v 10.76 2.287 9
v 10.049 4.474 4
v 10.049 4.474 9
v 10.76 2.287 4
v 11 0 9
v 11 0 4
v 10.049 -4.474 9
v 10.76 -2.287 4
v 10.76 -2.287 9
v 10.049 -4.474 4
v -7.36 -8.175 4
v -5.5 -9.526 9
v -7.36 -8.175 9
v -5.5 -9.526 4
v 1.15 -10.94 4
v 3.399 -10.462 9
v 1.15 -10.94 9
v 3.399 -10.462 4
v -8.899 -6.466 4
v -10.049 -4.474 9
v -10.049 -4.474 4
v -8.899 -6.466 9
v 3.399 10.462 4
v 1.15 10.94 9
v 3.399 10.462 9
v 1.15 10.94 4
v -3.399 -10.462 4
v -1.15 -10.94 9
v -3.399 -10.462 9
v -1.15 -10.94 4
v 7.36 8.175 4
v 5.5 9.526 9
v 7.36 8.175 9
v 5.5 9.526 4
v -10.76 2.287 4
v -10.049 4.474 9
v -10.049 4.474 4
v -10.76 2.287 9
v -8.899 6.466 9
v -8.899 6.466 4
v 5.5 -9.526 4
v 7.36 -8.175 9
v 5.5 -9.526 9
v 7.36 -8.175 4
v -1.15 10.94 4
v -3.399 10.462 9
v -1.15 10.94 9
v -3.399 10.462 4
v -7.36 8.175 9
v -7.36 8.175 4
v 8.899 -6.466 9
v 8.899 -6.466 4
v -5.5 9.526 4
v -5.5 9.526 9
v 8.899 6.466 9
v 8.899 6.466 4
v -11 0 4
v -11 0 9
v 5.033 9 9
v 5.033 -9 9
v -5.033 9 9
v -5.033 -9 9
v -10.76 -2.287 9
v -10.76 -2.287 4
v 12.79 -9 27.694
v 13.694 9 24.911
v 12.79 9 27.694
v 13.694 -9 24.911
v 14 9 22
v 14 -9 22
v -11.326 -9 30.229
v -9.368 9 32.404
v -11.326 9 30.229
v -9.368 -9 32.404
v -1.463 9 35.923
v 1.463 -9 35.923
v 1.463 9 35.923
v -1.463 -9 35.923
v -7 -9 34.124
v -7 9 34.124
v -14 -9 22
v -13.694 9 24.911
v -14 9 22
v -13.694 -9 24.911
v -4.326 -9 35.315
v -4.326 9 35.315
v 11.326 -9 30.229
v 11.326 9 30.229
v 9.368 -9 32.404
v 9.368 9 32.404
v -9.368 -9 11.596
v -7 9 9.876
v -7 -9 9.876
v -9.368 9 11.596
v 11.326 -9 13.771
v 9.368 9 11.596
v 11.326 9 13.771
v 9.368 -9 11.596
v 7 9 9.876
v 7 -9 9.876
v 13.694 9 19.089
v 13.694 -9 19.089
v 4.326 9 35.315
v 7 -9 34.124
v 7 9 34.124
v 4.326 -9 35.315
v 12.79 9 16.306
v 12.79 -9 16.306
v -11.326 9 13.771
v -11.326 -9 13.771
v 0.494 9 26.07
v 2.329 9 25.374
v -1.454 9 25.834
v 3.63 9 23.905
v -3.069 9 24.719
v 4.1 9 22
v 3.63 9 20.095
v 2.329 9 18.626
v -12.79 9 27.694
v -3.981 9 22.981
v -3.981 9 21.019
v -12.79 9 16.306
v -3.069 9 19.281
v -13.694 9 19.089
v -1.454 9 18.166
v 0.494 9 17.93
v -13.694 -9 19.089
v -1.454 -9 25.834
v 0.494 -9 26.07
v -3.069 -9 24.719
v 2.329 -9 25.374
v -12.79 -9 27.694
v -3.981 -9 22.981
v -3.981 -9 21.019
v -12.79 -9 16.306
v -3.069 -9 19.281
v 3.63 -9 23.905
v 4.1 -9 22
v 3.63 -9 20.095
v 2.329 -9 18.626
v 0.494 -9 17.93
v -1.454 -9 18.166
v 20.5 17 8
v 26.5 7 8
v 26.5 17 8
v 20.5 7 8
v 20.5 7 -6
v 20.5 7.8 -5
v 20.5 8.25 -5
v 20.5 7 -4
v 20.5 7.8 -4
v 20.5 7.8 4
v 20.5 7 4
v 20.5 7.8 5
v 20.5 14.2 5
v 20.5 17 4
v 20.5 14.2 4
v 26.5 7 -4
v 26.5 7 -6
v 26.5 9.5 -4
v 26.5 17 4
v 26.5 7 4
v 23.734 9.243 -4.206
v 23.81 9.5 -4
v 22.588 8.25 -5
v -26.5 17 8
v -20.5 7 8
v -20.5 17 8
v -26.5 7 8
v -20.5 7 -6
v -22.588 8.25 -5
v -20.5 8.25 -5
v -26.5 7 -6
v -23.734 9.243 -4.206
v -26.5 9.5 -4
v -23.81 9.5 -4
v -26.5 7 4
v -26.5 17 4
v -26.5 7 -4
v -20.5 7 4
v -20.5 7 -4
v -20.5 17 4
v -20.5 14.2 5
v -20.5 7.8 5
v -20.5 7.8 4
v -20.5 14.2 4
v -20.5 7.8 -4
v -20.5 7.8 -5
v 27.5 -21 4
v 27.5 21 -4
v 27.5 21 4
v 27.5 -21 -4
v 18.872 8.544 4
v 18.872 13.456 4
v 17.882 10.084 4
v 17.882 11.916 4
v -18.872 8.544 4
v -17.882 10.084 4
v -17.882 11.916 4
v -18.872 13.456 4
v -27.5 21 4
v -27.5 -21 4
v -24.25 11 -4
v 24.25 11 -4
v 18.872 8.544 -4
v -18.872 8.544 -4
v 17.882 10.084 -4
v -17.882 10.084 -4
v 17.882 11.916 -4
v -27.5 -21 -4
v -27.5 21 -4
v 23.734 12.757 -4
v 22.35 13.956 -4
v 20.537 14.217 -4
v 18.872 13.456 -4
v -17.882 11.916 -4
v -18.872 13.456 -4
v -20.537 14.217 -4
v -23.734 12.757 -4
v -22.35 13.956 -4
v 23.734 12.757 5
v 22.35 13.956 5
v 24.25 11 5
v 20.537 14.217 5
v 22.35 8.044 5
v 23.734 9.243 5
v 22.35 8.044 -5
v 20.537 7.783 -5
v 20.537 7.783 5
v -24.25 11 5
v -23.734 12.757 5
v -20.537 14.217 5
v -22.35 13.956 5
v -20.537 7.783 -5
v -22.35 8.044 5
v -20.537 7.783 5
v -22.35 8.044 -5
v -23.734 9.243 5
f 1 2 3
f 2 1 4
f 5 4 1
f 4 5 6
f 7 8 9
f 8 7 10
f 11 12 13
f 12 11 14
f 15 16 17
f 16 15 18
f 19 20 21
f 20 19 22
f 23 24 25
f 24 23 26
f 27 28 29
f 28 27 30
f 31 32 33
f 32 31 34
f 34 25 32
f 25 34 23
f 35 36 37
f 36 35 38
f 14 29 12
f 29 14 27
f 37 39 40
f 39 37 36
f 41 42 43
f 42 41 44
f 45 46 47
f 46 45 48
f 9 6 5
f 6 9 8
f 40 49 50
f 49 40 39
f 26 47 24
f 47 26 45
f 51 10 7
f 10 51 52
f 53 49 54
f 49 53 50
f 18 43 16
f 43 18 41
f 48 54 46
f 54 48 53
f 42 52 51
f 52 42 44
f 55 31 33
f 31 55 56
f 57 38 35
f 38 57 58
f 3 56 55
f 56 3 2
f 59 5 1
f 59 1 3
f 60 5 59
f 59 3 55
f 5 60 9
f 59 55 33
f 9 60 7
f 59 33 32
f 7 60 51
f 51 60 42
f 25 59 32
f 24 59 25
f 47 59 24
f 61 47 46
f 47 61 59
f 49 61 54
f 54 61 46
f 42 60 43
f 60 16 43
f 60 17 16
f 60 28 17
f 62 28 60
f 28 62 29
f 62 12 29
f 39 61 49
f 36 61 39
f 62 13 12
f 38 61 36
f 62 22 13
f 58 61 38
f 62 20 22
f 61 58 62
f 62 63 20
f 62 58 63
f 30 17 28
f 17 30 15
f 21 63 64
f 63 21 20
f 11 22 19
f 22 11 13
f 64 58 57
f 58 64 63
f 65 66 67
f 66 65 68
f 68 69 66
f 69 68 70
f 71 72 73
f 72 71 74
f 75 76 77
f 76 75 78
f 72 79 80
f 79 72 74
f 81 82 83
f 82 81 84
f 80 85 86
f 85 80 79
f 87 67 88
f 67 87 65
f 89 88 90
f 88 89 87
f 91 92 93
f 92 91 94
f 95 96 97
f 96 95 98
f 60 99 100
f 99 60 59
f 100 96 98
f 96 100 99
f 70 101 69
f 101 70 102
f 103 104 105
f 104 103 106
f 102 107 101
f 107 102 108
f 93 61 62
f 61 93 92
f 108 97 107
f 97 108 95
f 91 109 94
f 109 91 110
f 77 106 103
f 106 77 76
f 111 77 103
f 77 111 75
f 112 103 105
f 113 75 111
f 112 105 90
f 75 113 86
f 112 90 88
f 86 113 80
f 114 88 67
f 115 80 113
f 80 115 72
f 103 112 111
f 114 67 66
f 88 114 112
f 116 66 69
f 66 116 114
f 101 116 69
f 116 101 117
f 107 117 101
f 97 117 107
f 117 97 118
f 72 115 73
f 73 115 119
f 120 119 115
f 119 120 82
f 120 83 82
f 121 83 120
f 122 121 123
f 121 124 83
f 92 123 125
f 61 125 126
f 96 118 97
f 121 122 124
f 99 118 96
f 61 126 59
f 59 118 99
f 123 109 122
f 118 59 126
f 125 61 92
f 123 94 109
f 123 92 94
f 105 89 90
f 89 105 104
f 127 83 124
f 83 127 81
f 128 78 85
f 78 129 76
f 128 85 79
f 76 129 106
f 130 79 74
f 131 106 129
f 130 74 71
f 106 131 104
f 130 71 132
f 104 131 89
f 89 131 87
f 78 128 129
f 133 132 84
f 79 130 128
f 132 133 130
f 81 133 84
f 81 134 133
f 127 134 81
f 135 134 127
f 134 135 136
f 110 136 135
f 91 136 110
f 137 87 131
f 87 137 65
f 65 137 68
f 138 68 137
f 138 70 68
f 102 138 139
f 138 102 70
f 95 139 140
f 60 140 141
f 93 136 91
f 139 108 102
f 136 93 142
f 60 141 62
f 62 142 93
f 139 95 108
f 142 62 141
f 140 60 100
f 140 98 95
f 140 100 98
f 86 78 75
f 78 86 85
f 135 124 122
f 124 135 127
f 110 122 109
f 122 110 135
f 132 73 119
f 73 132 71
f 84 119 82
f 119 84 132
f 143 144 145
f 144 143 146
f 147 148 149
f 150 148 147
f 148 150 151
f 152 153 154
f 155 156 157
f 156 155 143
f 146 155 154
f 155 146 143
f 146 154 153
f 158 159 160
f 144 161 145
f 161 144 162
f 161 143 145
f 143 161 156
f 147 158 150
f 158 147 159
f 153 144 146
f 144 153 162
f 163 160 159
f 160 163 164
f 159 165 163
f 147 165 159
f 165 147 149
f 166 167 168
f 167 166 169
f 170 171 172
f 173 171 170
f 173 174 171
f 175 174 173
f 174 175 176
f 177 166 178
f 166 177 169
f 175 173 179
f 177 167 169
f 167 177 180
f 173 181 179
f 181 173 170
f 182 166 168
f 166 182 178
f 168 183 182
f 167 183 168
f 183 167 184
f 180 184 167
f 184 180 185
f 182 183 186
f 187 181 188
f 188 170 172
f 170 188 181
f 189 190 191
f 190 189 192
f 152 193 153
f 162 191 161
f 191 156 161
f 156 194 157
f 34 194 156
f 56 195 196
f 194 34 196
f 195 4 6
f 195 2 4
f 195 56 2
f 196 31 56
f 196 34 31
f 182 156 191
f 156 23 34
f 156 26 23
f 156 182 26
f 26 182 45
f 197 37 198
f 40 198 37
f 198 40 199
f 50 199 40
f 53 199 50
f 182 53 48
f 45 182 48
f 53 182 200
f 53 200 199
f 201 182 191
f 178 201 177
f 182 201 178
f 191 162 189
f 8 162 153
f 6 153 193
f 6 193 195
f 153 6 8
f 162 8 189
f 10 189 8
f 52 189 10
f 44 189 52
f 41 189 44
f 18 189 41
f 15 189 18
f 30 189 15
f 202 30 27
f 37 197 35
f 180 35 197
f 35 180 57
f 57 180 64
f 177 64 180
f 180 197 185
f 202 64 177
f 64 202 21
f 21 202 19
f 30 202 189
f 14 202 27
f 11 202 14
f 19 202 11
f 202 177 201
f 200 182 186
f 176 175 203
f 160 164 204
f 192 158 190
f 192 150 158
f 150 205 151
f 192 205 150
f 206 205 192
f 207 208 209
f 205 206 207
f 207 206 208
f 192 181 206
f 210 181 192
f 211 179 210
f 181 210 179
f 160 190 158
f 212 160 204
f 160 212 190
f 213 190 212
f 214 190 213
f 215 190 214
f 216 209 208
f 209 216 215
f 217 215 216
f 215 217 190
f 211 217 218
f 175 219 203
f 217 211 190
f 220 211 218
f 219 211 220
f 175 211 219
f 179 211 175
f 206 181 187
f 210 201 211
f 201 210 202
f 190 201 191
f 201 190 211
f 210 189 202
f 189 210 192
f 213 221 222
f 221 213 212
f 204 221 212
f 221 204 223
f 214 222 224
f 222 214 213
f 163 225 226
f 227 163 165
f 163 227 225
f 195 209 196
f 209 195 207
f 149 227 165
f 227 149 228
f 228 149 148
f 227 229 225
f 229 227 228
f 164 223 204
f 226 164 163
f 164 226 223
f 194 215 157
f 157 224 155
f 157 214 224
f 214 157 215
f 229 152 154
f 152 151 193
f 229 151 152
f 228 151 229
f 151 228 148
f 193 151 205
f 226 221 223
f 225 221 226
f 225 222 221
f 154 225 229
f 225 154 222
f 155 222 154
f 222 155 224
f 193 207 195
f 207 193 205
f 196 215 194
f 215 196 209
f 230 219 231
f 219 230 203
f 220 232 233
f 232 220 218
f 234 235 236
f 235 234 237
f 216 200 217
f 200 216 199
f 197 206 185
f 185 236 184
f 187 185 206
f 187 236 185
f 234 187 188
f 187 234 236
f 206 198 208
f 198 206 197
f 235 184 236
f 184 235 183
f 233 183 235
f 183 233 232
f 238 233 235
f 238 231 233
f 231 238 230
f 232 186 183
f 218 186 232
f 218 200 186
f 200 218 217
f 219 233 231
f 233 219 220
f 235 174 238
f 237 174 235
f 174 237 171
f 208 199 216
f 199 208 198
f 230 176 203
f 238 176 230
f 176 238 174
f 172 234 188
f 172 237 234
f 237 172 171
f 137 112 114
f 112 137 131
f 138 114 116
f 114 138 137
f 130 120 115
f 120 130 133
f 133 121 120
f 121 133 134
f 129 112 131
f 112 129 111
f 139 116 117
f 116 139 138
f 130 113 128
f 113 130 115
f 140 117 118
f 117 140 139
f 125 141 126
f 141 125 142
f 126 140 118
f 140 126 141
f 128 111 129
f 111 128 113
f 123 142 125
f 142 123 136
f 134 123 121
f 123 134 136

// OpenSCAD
// Parameters
shaft_diameter_mm = 8.0; //[4.0:16.0:0.1]
base_length_mm = 55.0; //[27.5:110.0:0.5]
base_width_mm = 42.0; //[21.0:84.0:0.5]
mounting_hole_diameter_mm = 6.5; //[3.0:10.0:0.1]
mounting_hole_center_spacing_mm = 42.0; //[25.0:80.0:0.5]
base_thickness_mm = 8.0; //[4.0:16.0:0.5]
overall_height_mm = 28.0; //[18.0:56.0:0.5]
housing_outer_diameter_mm = 28.0; //[18.0:56.0:0.5]
seat_height_mm = 6.0; //[3.0:12.0:0.5]
seat_diameter_mm = 22.0; //[14.0:40.0:0.5]
housing_length_y_mm = 18.0; //[10.0:36.0:0.5]
bore_clearance_mm = 0.2; //[0.0:0.6:0.05]
hole_edge_margin_x_mm = 6.5; //[4.0:12.0:0.5]
hole_offset_from_front_mm = 10.0; //[6.0:18.0:0.5]
trapezoid_height_mm = 10.0; //[6.0:20.0:0.5]
trapezoid_base_y_mm = 14.0; //[8.0:28.0:0.5]
trapezoid_top_y_mm = 6.0; //[3.0:18.0:0.5]
gusset_thickness_x_mm = 6.0; //[3.0:12.0:0.5]
overlap_mm = 1.0; //[0.5:2.0:0.1]

// ---------- Helpers / derived Z positions (centered solids) ----------
base_top_z = base_thickness_mm/2;

// Seat sits on base with overlap into base
seat_center_z = base_top_z + seat_height_mm/2 - overlap_mm;

// Housing (circular ring) must intersect the seat (and thus the base) by overlap_mm
// Seat top surface Z:
seat_top_z = seat_center_z + seat_height_mm/2;
// Place housing so its bottom is overlap_mm below seat top:
housing_center_z = (seat_top_z - overlap_mm) + housing_outer_diameter_mm/2;

// Right Trapezoid
module right_trapezoid() {
  linear_extrude(height=gusset_thickness_x_mm, center=true) {
    polygon(points=[
      [0, 0],
      [trapezoid_base_y_mm, 0],
      [trapezoid_top_y_mm, trapezoid_height_mm],
      [0, trapezoid_height_mm]
    ]);
  }
}

// KP Pillow Block Hole Positions
module kp_pillow_block_hole_positions() {
  translate([mounting_hole_center_spacing_mm/2, base_width_mm/2 - hole_offset_from_front_mm, 0])
    cylinder(r=mounting_hole_diameter_mm/2, h=base_thickness_mm + 2*overlap_mm, center=true);
  mirror([1, 0, 0]) {
    translate([mounting_hole_center_spacing_mm/2, base_width_mm/2 - hole_offset_from_front_mm, 0])
      cylinder(r=mounting_hole_diameter_mm/2, h=base_thickness_mm + 2*overlap_mm, center=true);
  }
}

// KP Pillow Block (circular bearing housing/ring)
module kp_pillow_block() {
  // Positioned to overlap the seat by overlap_mm (guaranteed physical connection)
  translate([0, 0, housing_center_z])
    rotate([90, 0, 0])
    cylinder(r=housing_outer_diameter_mm/2, h=housing_length_y_mm, center=true);
}

// KP Pillow Block Assembly (seat + housing + gussets)
module kp_pillow_block_assembly() {
  union() {
    // Seat (overlaps base by overlap_mm)
    translate([0, 0, seat_center_z])
      cylinder(r=seat_diameter_mm/2, h=seat_height_mm, center=true);

    // Housing (overlaps seat by overlap_mm)  <-- FIXES FLOATING RING
    kp_pillow_block();

    // Gussets (kept as-is but already overlapping via -overlap_mm in Z)
    translate([base_length_mm/2 - gusset_thickness_x_mm/2 - overlap_mm,
               housing_outer_diameter_mm/2 - trapezoid_base_y_mm/2,
               base_thickness_mm/2 + trapezoid_height_mm/2 - overlap_mm])
      rotate([0, 90, 0]) right_trapezoid();

    mirror([1, 0, 0]) {
      translate([base_length_mm/2 - gusset_thickness_x_mm/2 - overlap_mm,
                 housing_outer_diameter_mm/2 - trapezoid_base_y_mm/2,
                 base_thickness_mm/2 + trapezoid_height_mm/2 - overlap_mm])
        rotate([0, 90, 0]) right_trapezoid();
    }
  }
}

// SCS Bearing Block Assembly
module scs_bearing_block_assembly() {
  difference() {
    union() {
      // Base
      cube([base_length_mm, base_width_mm, base_thickness_mm], center=true);

      // Pillow block features (now physically connected to base via seat overlap)
      kp_pillow_block_assembly();
    }

    // Shaft bore (aligned with housing center; long enough to cut through)
    translate([0, 0, housing_center_z])
      rotate([90, 0, 0])
      cylinder(r=(shaft_diameter_mm + bore_clearance_mm)/2,
               h=base_width_mm + housing_length_y_mm + 2*overlap_mm,
               center=true);

    // Mounting holes
    kp_pillow_block_hole_positions();
  }
}

// Final Assembly
module assembly() {
  scs_bearing_block_assembly();
}

assembly();
